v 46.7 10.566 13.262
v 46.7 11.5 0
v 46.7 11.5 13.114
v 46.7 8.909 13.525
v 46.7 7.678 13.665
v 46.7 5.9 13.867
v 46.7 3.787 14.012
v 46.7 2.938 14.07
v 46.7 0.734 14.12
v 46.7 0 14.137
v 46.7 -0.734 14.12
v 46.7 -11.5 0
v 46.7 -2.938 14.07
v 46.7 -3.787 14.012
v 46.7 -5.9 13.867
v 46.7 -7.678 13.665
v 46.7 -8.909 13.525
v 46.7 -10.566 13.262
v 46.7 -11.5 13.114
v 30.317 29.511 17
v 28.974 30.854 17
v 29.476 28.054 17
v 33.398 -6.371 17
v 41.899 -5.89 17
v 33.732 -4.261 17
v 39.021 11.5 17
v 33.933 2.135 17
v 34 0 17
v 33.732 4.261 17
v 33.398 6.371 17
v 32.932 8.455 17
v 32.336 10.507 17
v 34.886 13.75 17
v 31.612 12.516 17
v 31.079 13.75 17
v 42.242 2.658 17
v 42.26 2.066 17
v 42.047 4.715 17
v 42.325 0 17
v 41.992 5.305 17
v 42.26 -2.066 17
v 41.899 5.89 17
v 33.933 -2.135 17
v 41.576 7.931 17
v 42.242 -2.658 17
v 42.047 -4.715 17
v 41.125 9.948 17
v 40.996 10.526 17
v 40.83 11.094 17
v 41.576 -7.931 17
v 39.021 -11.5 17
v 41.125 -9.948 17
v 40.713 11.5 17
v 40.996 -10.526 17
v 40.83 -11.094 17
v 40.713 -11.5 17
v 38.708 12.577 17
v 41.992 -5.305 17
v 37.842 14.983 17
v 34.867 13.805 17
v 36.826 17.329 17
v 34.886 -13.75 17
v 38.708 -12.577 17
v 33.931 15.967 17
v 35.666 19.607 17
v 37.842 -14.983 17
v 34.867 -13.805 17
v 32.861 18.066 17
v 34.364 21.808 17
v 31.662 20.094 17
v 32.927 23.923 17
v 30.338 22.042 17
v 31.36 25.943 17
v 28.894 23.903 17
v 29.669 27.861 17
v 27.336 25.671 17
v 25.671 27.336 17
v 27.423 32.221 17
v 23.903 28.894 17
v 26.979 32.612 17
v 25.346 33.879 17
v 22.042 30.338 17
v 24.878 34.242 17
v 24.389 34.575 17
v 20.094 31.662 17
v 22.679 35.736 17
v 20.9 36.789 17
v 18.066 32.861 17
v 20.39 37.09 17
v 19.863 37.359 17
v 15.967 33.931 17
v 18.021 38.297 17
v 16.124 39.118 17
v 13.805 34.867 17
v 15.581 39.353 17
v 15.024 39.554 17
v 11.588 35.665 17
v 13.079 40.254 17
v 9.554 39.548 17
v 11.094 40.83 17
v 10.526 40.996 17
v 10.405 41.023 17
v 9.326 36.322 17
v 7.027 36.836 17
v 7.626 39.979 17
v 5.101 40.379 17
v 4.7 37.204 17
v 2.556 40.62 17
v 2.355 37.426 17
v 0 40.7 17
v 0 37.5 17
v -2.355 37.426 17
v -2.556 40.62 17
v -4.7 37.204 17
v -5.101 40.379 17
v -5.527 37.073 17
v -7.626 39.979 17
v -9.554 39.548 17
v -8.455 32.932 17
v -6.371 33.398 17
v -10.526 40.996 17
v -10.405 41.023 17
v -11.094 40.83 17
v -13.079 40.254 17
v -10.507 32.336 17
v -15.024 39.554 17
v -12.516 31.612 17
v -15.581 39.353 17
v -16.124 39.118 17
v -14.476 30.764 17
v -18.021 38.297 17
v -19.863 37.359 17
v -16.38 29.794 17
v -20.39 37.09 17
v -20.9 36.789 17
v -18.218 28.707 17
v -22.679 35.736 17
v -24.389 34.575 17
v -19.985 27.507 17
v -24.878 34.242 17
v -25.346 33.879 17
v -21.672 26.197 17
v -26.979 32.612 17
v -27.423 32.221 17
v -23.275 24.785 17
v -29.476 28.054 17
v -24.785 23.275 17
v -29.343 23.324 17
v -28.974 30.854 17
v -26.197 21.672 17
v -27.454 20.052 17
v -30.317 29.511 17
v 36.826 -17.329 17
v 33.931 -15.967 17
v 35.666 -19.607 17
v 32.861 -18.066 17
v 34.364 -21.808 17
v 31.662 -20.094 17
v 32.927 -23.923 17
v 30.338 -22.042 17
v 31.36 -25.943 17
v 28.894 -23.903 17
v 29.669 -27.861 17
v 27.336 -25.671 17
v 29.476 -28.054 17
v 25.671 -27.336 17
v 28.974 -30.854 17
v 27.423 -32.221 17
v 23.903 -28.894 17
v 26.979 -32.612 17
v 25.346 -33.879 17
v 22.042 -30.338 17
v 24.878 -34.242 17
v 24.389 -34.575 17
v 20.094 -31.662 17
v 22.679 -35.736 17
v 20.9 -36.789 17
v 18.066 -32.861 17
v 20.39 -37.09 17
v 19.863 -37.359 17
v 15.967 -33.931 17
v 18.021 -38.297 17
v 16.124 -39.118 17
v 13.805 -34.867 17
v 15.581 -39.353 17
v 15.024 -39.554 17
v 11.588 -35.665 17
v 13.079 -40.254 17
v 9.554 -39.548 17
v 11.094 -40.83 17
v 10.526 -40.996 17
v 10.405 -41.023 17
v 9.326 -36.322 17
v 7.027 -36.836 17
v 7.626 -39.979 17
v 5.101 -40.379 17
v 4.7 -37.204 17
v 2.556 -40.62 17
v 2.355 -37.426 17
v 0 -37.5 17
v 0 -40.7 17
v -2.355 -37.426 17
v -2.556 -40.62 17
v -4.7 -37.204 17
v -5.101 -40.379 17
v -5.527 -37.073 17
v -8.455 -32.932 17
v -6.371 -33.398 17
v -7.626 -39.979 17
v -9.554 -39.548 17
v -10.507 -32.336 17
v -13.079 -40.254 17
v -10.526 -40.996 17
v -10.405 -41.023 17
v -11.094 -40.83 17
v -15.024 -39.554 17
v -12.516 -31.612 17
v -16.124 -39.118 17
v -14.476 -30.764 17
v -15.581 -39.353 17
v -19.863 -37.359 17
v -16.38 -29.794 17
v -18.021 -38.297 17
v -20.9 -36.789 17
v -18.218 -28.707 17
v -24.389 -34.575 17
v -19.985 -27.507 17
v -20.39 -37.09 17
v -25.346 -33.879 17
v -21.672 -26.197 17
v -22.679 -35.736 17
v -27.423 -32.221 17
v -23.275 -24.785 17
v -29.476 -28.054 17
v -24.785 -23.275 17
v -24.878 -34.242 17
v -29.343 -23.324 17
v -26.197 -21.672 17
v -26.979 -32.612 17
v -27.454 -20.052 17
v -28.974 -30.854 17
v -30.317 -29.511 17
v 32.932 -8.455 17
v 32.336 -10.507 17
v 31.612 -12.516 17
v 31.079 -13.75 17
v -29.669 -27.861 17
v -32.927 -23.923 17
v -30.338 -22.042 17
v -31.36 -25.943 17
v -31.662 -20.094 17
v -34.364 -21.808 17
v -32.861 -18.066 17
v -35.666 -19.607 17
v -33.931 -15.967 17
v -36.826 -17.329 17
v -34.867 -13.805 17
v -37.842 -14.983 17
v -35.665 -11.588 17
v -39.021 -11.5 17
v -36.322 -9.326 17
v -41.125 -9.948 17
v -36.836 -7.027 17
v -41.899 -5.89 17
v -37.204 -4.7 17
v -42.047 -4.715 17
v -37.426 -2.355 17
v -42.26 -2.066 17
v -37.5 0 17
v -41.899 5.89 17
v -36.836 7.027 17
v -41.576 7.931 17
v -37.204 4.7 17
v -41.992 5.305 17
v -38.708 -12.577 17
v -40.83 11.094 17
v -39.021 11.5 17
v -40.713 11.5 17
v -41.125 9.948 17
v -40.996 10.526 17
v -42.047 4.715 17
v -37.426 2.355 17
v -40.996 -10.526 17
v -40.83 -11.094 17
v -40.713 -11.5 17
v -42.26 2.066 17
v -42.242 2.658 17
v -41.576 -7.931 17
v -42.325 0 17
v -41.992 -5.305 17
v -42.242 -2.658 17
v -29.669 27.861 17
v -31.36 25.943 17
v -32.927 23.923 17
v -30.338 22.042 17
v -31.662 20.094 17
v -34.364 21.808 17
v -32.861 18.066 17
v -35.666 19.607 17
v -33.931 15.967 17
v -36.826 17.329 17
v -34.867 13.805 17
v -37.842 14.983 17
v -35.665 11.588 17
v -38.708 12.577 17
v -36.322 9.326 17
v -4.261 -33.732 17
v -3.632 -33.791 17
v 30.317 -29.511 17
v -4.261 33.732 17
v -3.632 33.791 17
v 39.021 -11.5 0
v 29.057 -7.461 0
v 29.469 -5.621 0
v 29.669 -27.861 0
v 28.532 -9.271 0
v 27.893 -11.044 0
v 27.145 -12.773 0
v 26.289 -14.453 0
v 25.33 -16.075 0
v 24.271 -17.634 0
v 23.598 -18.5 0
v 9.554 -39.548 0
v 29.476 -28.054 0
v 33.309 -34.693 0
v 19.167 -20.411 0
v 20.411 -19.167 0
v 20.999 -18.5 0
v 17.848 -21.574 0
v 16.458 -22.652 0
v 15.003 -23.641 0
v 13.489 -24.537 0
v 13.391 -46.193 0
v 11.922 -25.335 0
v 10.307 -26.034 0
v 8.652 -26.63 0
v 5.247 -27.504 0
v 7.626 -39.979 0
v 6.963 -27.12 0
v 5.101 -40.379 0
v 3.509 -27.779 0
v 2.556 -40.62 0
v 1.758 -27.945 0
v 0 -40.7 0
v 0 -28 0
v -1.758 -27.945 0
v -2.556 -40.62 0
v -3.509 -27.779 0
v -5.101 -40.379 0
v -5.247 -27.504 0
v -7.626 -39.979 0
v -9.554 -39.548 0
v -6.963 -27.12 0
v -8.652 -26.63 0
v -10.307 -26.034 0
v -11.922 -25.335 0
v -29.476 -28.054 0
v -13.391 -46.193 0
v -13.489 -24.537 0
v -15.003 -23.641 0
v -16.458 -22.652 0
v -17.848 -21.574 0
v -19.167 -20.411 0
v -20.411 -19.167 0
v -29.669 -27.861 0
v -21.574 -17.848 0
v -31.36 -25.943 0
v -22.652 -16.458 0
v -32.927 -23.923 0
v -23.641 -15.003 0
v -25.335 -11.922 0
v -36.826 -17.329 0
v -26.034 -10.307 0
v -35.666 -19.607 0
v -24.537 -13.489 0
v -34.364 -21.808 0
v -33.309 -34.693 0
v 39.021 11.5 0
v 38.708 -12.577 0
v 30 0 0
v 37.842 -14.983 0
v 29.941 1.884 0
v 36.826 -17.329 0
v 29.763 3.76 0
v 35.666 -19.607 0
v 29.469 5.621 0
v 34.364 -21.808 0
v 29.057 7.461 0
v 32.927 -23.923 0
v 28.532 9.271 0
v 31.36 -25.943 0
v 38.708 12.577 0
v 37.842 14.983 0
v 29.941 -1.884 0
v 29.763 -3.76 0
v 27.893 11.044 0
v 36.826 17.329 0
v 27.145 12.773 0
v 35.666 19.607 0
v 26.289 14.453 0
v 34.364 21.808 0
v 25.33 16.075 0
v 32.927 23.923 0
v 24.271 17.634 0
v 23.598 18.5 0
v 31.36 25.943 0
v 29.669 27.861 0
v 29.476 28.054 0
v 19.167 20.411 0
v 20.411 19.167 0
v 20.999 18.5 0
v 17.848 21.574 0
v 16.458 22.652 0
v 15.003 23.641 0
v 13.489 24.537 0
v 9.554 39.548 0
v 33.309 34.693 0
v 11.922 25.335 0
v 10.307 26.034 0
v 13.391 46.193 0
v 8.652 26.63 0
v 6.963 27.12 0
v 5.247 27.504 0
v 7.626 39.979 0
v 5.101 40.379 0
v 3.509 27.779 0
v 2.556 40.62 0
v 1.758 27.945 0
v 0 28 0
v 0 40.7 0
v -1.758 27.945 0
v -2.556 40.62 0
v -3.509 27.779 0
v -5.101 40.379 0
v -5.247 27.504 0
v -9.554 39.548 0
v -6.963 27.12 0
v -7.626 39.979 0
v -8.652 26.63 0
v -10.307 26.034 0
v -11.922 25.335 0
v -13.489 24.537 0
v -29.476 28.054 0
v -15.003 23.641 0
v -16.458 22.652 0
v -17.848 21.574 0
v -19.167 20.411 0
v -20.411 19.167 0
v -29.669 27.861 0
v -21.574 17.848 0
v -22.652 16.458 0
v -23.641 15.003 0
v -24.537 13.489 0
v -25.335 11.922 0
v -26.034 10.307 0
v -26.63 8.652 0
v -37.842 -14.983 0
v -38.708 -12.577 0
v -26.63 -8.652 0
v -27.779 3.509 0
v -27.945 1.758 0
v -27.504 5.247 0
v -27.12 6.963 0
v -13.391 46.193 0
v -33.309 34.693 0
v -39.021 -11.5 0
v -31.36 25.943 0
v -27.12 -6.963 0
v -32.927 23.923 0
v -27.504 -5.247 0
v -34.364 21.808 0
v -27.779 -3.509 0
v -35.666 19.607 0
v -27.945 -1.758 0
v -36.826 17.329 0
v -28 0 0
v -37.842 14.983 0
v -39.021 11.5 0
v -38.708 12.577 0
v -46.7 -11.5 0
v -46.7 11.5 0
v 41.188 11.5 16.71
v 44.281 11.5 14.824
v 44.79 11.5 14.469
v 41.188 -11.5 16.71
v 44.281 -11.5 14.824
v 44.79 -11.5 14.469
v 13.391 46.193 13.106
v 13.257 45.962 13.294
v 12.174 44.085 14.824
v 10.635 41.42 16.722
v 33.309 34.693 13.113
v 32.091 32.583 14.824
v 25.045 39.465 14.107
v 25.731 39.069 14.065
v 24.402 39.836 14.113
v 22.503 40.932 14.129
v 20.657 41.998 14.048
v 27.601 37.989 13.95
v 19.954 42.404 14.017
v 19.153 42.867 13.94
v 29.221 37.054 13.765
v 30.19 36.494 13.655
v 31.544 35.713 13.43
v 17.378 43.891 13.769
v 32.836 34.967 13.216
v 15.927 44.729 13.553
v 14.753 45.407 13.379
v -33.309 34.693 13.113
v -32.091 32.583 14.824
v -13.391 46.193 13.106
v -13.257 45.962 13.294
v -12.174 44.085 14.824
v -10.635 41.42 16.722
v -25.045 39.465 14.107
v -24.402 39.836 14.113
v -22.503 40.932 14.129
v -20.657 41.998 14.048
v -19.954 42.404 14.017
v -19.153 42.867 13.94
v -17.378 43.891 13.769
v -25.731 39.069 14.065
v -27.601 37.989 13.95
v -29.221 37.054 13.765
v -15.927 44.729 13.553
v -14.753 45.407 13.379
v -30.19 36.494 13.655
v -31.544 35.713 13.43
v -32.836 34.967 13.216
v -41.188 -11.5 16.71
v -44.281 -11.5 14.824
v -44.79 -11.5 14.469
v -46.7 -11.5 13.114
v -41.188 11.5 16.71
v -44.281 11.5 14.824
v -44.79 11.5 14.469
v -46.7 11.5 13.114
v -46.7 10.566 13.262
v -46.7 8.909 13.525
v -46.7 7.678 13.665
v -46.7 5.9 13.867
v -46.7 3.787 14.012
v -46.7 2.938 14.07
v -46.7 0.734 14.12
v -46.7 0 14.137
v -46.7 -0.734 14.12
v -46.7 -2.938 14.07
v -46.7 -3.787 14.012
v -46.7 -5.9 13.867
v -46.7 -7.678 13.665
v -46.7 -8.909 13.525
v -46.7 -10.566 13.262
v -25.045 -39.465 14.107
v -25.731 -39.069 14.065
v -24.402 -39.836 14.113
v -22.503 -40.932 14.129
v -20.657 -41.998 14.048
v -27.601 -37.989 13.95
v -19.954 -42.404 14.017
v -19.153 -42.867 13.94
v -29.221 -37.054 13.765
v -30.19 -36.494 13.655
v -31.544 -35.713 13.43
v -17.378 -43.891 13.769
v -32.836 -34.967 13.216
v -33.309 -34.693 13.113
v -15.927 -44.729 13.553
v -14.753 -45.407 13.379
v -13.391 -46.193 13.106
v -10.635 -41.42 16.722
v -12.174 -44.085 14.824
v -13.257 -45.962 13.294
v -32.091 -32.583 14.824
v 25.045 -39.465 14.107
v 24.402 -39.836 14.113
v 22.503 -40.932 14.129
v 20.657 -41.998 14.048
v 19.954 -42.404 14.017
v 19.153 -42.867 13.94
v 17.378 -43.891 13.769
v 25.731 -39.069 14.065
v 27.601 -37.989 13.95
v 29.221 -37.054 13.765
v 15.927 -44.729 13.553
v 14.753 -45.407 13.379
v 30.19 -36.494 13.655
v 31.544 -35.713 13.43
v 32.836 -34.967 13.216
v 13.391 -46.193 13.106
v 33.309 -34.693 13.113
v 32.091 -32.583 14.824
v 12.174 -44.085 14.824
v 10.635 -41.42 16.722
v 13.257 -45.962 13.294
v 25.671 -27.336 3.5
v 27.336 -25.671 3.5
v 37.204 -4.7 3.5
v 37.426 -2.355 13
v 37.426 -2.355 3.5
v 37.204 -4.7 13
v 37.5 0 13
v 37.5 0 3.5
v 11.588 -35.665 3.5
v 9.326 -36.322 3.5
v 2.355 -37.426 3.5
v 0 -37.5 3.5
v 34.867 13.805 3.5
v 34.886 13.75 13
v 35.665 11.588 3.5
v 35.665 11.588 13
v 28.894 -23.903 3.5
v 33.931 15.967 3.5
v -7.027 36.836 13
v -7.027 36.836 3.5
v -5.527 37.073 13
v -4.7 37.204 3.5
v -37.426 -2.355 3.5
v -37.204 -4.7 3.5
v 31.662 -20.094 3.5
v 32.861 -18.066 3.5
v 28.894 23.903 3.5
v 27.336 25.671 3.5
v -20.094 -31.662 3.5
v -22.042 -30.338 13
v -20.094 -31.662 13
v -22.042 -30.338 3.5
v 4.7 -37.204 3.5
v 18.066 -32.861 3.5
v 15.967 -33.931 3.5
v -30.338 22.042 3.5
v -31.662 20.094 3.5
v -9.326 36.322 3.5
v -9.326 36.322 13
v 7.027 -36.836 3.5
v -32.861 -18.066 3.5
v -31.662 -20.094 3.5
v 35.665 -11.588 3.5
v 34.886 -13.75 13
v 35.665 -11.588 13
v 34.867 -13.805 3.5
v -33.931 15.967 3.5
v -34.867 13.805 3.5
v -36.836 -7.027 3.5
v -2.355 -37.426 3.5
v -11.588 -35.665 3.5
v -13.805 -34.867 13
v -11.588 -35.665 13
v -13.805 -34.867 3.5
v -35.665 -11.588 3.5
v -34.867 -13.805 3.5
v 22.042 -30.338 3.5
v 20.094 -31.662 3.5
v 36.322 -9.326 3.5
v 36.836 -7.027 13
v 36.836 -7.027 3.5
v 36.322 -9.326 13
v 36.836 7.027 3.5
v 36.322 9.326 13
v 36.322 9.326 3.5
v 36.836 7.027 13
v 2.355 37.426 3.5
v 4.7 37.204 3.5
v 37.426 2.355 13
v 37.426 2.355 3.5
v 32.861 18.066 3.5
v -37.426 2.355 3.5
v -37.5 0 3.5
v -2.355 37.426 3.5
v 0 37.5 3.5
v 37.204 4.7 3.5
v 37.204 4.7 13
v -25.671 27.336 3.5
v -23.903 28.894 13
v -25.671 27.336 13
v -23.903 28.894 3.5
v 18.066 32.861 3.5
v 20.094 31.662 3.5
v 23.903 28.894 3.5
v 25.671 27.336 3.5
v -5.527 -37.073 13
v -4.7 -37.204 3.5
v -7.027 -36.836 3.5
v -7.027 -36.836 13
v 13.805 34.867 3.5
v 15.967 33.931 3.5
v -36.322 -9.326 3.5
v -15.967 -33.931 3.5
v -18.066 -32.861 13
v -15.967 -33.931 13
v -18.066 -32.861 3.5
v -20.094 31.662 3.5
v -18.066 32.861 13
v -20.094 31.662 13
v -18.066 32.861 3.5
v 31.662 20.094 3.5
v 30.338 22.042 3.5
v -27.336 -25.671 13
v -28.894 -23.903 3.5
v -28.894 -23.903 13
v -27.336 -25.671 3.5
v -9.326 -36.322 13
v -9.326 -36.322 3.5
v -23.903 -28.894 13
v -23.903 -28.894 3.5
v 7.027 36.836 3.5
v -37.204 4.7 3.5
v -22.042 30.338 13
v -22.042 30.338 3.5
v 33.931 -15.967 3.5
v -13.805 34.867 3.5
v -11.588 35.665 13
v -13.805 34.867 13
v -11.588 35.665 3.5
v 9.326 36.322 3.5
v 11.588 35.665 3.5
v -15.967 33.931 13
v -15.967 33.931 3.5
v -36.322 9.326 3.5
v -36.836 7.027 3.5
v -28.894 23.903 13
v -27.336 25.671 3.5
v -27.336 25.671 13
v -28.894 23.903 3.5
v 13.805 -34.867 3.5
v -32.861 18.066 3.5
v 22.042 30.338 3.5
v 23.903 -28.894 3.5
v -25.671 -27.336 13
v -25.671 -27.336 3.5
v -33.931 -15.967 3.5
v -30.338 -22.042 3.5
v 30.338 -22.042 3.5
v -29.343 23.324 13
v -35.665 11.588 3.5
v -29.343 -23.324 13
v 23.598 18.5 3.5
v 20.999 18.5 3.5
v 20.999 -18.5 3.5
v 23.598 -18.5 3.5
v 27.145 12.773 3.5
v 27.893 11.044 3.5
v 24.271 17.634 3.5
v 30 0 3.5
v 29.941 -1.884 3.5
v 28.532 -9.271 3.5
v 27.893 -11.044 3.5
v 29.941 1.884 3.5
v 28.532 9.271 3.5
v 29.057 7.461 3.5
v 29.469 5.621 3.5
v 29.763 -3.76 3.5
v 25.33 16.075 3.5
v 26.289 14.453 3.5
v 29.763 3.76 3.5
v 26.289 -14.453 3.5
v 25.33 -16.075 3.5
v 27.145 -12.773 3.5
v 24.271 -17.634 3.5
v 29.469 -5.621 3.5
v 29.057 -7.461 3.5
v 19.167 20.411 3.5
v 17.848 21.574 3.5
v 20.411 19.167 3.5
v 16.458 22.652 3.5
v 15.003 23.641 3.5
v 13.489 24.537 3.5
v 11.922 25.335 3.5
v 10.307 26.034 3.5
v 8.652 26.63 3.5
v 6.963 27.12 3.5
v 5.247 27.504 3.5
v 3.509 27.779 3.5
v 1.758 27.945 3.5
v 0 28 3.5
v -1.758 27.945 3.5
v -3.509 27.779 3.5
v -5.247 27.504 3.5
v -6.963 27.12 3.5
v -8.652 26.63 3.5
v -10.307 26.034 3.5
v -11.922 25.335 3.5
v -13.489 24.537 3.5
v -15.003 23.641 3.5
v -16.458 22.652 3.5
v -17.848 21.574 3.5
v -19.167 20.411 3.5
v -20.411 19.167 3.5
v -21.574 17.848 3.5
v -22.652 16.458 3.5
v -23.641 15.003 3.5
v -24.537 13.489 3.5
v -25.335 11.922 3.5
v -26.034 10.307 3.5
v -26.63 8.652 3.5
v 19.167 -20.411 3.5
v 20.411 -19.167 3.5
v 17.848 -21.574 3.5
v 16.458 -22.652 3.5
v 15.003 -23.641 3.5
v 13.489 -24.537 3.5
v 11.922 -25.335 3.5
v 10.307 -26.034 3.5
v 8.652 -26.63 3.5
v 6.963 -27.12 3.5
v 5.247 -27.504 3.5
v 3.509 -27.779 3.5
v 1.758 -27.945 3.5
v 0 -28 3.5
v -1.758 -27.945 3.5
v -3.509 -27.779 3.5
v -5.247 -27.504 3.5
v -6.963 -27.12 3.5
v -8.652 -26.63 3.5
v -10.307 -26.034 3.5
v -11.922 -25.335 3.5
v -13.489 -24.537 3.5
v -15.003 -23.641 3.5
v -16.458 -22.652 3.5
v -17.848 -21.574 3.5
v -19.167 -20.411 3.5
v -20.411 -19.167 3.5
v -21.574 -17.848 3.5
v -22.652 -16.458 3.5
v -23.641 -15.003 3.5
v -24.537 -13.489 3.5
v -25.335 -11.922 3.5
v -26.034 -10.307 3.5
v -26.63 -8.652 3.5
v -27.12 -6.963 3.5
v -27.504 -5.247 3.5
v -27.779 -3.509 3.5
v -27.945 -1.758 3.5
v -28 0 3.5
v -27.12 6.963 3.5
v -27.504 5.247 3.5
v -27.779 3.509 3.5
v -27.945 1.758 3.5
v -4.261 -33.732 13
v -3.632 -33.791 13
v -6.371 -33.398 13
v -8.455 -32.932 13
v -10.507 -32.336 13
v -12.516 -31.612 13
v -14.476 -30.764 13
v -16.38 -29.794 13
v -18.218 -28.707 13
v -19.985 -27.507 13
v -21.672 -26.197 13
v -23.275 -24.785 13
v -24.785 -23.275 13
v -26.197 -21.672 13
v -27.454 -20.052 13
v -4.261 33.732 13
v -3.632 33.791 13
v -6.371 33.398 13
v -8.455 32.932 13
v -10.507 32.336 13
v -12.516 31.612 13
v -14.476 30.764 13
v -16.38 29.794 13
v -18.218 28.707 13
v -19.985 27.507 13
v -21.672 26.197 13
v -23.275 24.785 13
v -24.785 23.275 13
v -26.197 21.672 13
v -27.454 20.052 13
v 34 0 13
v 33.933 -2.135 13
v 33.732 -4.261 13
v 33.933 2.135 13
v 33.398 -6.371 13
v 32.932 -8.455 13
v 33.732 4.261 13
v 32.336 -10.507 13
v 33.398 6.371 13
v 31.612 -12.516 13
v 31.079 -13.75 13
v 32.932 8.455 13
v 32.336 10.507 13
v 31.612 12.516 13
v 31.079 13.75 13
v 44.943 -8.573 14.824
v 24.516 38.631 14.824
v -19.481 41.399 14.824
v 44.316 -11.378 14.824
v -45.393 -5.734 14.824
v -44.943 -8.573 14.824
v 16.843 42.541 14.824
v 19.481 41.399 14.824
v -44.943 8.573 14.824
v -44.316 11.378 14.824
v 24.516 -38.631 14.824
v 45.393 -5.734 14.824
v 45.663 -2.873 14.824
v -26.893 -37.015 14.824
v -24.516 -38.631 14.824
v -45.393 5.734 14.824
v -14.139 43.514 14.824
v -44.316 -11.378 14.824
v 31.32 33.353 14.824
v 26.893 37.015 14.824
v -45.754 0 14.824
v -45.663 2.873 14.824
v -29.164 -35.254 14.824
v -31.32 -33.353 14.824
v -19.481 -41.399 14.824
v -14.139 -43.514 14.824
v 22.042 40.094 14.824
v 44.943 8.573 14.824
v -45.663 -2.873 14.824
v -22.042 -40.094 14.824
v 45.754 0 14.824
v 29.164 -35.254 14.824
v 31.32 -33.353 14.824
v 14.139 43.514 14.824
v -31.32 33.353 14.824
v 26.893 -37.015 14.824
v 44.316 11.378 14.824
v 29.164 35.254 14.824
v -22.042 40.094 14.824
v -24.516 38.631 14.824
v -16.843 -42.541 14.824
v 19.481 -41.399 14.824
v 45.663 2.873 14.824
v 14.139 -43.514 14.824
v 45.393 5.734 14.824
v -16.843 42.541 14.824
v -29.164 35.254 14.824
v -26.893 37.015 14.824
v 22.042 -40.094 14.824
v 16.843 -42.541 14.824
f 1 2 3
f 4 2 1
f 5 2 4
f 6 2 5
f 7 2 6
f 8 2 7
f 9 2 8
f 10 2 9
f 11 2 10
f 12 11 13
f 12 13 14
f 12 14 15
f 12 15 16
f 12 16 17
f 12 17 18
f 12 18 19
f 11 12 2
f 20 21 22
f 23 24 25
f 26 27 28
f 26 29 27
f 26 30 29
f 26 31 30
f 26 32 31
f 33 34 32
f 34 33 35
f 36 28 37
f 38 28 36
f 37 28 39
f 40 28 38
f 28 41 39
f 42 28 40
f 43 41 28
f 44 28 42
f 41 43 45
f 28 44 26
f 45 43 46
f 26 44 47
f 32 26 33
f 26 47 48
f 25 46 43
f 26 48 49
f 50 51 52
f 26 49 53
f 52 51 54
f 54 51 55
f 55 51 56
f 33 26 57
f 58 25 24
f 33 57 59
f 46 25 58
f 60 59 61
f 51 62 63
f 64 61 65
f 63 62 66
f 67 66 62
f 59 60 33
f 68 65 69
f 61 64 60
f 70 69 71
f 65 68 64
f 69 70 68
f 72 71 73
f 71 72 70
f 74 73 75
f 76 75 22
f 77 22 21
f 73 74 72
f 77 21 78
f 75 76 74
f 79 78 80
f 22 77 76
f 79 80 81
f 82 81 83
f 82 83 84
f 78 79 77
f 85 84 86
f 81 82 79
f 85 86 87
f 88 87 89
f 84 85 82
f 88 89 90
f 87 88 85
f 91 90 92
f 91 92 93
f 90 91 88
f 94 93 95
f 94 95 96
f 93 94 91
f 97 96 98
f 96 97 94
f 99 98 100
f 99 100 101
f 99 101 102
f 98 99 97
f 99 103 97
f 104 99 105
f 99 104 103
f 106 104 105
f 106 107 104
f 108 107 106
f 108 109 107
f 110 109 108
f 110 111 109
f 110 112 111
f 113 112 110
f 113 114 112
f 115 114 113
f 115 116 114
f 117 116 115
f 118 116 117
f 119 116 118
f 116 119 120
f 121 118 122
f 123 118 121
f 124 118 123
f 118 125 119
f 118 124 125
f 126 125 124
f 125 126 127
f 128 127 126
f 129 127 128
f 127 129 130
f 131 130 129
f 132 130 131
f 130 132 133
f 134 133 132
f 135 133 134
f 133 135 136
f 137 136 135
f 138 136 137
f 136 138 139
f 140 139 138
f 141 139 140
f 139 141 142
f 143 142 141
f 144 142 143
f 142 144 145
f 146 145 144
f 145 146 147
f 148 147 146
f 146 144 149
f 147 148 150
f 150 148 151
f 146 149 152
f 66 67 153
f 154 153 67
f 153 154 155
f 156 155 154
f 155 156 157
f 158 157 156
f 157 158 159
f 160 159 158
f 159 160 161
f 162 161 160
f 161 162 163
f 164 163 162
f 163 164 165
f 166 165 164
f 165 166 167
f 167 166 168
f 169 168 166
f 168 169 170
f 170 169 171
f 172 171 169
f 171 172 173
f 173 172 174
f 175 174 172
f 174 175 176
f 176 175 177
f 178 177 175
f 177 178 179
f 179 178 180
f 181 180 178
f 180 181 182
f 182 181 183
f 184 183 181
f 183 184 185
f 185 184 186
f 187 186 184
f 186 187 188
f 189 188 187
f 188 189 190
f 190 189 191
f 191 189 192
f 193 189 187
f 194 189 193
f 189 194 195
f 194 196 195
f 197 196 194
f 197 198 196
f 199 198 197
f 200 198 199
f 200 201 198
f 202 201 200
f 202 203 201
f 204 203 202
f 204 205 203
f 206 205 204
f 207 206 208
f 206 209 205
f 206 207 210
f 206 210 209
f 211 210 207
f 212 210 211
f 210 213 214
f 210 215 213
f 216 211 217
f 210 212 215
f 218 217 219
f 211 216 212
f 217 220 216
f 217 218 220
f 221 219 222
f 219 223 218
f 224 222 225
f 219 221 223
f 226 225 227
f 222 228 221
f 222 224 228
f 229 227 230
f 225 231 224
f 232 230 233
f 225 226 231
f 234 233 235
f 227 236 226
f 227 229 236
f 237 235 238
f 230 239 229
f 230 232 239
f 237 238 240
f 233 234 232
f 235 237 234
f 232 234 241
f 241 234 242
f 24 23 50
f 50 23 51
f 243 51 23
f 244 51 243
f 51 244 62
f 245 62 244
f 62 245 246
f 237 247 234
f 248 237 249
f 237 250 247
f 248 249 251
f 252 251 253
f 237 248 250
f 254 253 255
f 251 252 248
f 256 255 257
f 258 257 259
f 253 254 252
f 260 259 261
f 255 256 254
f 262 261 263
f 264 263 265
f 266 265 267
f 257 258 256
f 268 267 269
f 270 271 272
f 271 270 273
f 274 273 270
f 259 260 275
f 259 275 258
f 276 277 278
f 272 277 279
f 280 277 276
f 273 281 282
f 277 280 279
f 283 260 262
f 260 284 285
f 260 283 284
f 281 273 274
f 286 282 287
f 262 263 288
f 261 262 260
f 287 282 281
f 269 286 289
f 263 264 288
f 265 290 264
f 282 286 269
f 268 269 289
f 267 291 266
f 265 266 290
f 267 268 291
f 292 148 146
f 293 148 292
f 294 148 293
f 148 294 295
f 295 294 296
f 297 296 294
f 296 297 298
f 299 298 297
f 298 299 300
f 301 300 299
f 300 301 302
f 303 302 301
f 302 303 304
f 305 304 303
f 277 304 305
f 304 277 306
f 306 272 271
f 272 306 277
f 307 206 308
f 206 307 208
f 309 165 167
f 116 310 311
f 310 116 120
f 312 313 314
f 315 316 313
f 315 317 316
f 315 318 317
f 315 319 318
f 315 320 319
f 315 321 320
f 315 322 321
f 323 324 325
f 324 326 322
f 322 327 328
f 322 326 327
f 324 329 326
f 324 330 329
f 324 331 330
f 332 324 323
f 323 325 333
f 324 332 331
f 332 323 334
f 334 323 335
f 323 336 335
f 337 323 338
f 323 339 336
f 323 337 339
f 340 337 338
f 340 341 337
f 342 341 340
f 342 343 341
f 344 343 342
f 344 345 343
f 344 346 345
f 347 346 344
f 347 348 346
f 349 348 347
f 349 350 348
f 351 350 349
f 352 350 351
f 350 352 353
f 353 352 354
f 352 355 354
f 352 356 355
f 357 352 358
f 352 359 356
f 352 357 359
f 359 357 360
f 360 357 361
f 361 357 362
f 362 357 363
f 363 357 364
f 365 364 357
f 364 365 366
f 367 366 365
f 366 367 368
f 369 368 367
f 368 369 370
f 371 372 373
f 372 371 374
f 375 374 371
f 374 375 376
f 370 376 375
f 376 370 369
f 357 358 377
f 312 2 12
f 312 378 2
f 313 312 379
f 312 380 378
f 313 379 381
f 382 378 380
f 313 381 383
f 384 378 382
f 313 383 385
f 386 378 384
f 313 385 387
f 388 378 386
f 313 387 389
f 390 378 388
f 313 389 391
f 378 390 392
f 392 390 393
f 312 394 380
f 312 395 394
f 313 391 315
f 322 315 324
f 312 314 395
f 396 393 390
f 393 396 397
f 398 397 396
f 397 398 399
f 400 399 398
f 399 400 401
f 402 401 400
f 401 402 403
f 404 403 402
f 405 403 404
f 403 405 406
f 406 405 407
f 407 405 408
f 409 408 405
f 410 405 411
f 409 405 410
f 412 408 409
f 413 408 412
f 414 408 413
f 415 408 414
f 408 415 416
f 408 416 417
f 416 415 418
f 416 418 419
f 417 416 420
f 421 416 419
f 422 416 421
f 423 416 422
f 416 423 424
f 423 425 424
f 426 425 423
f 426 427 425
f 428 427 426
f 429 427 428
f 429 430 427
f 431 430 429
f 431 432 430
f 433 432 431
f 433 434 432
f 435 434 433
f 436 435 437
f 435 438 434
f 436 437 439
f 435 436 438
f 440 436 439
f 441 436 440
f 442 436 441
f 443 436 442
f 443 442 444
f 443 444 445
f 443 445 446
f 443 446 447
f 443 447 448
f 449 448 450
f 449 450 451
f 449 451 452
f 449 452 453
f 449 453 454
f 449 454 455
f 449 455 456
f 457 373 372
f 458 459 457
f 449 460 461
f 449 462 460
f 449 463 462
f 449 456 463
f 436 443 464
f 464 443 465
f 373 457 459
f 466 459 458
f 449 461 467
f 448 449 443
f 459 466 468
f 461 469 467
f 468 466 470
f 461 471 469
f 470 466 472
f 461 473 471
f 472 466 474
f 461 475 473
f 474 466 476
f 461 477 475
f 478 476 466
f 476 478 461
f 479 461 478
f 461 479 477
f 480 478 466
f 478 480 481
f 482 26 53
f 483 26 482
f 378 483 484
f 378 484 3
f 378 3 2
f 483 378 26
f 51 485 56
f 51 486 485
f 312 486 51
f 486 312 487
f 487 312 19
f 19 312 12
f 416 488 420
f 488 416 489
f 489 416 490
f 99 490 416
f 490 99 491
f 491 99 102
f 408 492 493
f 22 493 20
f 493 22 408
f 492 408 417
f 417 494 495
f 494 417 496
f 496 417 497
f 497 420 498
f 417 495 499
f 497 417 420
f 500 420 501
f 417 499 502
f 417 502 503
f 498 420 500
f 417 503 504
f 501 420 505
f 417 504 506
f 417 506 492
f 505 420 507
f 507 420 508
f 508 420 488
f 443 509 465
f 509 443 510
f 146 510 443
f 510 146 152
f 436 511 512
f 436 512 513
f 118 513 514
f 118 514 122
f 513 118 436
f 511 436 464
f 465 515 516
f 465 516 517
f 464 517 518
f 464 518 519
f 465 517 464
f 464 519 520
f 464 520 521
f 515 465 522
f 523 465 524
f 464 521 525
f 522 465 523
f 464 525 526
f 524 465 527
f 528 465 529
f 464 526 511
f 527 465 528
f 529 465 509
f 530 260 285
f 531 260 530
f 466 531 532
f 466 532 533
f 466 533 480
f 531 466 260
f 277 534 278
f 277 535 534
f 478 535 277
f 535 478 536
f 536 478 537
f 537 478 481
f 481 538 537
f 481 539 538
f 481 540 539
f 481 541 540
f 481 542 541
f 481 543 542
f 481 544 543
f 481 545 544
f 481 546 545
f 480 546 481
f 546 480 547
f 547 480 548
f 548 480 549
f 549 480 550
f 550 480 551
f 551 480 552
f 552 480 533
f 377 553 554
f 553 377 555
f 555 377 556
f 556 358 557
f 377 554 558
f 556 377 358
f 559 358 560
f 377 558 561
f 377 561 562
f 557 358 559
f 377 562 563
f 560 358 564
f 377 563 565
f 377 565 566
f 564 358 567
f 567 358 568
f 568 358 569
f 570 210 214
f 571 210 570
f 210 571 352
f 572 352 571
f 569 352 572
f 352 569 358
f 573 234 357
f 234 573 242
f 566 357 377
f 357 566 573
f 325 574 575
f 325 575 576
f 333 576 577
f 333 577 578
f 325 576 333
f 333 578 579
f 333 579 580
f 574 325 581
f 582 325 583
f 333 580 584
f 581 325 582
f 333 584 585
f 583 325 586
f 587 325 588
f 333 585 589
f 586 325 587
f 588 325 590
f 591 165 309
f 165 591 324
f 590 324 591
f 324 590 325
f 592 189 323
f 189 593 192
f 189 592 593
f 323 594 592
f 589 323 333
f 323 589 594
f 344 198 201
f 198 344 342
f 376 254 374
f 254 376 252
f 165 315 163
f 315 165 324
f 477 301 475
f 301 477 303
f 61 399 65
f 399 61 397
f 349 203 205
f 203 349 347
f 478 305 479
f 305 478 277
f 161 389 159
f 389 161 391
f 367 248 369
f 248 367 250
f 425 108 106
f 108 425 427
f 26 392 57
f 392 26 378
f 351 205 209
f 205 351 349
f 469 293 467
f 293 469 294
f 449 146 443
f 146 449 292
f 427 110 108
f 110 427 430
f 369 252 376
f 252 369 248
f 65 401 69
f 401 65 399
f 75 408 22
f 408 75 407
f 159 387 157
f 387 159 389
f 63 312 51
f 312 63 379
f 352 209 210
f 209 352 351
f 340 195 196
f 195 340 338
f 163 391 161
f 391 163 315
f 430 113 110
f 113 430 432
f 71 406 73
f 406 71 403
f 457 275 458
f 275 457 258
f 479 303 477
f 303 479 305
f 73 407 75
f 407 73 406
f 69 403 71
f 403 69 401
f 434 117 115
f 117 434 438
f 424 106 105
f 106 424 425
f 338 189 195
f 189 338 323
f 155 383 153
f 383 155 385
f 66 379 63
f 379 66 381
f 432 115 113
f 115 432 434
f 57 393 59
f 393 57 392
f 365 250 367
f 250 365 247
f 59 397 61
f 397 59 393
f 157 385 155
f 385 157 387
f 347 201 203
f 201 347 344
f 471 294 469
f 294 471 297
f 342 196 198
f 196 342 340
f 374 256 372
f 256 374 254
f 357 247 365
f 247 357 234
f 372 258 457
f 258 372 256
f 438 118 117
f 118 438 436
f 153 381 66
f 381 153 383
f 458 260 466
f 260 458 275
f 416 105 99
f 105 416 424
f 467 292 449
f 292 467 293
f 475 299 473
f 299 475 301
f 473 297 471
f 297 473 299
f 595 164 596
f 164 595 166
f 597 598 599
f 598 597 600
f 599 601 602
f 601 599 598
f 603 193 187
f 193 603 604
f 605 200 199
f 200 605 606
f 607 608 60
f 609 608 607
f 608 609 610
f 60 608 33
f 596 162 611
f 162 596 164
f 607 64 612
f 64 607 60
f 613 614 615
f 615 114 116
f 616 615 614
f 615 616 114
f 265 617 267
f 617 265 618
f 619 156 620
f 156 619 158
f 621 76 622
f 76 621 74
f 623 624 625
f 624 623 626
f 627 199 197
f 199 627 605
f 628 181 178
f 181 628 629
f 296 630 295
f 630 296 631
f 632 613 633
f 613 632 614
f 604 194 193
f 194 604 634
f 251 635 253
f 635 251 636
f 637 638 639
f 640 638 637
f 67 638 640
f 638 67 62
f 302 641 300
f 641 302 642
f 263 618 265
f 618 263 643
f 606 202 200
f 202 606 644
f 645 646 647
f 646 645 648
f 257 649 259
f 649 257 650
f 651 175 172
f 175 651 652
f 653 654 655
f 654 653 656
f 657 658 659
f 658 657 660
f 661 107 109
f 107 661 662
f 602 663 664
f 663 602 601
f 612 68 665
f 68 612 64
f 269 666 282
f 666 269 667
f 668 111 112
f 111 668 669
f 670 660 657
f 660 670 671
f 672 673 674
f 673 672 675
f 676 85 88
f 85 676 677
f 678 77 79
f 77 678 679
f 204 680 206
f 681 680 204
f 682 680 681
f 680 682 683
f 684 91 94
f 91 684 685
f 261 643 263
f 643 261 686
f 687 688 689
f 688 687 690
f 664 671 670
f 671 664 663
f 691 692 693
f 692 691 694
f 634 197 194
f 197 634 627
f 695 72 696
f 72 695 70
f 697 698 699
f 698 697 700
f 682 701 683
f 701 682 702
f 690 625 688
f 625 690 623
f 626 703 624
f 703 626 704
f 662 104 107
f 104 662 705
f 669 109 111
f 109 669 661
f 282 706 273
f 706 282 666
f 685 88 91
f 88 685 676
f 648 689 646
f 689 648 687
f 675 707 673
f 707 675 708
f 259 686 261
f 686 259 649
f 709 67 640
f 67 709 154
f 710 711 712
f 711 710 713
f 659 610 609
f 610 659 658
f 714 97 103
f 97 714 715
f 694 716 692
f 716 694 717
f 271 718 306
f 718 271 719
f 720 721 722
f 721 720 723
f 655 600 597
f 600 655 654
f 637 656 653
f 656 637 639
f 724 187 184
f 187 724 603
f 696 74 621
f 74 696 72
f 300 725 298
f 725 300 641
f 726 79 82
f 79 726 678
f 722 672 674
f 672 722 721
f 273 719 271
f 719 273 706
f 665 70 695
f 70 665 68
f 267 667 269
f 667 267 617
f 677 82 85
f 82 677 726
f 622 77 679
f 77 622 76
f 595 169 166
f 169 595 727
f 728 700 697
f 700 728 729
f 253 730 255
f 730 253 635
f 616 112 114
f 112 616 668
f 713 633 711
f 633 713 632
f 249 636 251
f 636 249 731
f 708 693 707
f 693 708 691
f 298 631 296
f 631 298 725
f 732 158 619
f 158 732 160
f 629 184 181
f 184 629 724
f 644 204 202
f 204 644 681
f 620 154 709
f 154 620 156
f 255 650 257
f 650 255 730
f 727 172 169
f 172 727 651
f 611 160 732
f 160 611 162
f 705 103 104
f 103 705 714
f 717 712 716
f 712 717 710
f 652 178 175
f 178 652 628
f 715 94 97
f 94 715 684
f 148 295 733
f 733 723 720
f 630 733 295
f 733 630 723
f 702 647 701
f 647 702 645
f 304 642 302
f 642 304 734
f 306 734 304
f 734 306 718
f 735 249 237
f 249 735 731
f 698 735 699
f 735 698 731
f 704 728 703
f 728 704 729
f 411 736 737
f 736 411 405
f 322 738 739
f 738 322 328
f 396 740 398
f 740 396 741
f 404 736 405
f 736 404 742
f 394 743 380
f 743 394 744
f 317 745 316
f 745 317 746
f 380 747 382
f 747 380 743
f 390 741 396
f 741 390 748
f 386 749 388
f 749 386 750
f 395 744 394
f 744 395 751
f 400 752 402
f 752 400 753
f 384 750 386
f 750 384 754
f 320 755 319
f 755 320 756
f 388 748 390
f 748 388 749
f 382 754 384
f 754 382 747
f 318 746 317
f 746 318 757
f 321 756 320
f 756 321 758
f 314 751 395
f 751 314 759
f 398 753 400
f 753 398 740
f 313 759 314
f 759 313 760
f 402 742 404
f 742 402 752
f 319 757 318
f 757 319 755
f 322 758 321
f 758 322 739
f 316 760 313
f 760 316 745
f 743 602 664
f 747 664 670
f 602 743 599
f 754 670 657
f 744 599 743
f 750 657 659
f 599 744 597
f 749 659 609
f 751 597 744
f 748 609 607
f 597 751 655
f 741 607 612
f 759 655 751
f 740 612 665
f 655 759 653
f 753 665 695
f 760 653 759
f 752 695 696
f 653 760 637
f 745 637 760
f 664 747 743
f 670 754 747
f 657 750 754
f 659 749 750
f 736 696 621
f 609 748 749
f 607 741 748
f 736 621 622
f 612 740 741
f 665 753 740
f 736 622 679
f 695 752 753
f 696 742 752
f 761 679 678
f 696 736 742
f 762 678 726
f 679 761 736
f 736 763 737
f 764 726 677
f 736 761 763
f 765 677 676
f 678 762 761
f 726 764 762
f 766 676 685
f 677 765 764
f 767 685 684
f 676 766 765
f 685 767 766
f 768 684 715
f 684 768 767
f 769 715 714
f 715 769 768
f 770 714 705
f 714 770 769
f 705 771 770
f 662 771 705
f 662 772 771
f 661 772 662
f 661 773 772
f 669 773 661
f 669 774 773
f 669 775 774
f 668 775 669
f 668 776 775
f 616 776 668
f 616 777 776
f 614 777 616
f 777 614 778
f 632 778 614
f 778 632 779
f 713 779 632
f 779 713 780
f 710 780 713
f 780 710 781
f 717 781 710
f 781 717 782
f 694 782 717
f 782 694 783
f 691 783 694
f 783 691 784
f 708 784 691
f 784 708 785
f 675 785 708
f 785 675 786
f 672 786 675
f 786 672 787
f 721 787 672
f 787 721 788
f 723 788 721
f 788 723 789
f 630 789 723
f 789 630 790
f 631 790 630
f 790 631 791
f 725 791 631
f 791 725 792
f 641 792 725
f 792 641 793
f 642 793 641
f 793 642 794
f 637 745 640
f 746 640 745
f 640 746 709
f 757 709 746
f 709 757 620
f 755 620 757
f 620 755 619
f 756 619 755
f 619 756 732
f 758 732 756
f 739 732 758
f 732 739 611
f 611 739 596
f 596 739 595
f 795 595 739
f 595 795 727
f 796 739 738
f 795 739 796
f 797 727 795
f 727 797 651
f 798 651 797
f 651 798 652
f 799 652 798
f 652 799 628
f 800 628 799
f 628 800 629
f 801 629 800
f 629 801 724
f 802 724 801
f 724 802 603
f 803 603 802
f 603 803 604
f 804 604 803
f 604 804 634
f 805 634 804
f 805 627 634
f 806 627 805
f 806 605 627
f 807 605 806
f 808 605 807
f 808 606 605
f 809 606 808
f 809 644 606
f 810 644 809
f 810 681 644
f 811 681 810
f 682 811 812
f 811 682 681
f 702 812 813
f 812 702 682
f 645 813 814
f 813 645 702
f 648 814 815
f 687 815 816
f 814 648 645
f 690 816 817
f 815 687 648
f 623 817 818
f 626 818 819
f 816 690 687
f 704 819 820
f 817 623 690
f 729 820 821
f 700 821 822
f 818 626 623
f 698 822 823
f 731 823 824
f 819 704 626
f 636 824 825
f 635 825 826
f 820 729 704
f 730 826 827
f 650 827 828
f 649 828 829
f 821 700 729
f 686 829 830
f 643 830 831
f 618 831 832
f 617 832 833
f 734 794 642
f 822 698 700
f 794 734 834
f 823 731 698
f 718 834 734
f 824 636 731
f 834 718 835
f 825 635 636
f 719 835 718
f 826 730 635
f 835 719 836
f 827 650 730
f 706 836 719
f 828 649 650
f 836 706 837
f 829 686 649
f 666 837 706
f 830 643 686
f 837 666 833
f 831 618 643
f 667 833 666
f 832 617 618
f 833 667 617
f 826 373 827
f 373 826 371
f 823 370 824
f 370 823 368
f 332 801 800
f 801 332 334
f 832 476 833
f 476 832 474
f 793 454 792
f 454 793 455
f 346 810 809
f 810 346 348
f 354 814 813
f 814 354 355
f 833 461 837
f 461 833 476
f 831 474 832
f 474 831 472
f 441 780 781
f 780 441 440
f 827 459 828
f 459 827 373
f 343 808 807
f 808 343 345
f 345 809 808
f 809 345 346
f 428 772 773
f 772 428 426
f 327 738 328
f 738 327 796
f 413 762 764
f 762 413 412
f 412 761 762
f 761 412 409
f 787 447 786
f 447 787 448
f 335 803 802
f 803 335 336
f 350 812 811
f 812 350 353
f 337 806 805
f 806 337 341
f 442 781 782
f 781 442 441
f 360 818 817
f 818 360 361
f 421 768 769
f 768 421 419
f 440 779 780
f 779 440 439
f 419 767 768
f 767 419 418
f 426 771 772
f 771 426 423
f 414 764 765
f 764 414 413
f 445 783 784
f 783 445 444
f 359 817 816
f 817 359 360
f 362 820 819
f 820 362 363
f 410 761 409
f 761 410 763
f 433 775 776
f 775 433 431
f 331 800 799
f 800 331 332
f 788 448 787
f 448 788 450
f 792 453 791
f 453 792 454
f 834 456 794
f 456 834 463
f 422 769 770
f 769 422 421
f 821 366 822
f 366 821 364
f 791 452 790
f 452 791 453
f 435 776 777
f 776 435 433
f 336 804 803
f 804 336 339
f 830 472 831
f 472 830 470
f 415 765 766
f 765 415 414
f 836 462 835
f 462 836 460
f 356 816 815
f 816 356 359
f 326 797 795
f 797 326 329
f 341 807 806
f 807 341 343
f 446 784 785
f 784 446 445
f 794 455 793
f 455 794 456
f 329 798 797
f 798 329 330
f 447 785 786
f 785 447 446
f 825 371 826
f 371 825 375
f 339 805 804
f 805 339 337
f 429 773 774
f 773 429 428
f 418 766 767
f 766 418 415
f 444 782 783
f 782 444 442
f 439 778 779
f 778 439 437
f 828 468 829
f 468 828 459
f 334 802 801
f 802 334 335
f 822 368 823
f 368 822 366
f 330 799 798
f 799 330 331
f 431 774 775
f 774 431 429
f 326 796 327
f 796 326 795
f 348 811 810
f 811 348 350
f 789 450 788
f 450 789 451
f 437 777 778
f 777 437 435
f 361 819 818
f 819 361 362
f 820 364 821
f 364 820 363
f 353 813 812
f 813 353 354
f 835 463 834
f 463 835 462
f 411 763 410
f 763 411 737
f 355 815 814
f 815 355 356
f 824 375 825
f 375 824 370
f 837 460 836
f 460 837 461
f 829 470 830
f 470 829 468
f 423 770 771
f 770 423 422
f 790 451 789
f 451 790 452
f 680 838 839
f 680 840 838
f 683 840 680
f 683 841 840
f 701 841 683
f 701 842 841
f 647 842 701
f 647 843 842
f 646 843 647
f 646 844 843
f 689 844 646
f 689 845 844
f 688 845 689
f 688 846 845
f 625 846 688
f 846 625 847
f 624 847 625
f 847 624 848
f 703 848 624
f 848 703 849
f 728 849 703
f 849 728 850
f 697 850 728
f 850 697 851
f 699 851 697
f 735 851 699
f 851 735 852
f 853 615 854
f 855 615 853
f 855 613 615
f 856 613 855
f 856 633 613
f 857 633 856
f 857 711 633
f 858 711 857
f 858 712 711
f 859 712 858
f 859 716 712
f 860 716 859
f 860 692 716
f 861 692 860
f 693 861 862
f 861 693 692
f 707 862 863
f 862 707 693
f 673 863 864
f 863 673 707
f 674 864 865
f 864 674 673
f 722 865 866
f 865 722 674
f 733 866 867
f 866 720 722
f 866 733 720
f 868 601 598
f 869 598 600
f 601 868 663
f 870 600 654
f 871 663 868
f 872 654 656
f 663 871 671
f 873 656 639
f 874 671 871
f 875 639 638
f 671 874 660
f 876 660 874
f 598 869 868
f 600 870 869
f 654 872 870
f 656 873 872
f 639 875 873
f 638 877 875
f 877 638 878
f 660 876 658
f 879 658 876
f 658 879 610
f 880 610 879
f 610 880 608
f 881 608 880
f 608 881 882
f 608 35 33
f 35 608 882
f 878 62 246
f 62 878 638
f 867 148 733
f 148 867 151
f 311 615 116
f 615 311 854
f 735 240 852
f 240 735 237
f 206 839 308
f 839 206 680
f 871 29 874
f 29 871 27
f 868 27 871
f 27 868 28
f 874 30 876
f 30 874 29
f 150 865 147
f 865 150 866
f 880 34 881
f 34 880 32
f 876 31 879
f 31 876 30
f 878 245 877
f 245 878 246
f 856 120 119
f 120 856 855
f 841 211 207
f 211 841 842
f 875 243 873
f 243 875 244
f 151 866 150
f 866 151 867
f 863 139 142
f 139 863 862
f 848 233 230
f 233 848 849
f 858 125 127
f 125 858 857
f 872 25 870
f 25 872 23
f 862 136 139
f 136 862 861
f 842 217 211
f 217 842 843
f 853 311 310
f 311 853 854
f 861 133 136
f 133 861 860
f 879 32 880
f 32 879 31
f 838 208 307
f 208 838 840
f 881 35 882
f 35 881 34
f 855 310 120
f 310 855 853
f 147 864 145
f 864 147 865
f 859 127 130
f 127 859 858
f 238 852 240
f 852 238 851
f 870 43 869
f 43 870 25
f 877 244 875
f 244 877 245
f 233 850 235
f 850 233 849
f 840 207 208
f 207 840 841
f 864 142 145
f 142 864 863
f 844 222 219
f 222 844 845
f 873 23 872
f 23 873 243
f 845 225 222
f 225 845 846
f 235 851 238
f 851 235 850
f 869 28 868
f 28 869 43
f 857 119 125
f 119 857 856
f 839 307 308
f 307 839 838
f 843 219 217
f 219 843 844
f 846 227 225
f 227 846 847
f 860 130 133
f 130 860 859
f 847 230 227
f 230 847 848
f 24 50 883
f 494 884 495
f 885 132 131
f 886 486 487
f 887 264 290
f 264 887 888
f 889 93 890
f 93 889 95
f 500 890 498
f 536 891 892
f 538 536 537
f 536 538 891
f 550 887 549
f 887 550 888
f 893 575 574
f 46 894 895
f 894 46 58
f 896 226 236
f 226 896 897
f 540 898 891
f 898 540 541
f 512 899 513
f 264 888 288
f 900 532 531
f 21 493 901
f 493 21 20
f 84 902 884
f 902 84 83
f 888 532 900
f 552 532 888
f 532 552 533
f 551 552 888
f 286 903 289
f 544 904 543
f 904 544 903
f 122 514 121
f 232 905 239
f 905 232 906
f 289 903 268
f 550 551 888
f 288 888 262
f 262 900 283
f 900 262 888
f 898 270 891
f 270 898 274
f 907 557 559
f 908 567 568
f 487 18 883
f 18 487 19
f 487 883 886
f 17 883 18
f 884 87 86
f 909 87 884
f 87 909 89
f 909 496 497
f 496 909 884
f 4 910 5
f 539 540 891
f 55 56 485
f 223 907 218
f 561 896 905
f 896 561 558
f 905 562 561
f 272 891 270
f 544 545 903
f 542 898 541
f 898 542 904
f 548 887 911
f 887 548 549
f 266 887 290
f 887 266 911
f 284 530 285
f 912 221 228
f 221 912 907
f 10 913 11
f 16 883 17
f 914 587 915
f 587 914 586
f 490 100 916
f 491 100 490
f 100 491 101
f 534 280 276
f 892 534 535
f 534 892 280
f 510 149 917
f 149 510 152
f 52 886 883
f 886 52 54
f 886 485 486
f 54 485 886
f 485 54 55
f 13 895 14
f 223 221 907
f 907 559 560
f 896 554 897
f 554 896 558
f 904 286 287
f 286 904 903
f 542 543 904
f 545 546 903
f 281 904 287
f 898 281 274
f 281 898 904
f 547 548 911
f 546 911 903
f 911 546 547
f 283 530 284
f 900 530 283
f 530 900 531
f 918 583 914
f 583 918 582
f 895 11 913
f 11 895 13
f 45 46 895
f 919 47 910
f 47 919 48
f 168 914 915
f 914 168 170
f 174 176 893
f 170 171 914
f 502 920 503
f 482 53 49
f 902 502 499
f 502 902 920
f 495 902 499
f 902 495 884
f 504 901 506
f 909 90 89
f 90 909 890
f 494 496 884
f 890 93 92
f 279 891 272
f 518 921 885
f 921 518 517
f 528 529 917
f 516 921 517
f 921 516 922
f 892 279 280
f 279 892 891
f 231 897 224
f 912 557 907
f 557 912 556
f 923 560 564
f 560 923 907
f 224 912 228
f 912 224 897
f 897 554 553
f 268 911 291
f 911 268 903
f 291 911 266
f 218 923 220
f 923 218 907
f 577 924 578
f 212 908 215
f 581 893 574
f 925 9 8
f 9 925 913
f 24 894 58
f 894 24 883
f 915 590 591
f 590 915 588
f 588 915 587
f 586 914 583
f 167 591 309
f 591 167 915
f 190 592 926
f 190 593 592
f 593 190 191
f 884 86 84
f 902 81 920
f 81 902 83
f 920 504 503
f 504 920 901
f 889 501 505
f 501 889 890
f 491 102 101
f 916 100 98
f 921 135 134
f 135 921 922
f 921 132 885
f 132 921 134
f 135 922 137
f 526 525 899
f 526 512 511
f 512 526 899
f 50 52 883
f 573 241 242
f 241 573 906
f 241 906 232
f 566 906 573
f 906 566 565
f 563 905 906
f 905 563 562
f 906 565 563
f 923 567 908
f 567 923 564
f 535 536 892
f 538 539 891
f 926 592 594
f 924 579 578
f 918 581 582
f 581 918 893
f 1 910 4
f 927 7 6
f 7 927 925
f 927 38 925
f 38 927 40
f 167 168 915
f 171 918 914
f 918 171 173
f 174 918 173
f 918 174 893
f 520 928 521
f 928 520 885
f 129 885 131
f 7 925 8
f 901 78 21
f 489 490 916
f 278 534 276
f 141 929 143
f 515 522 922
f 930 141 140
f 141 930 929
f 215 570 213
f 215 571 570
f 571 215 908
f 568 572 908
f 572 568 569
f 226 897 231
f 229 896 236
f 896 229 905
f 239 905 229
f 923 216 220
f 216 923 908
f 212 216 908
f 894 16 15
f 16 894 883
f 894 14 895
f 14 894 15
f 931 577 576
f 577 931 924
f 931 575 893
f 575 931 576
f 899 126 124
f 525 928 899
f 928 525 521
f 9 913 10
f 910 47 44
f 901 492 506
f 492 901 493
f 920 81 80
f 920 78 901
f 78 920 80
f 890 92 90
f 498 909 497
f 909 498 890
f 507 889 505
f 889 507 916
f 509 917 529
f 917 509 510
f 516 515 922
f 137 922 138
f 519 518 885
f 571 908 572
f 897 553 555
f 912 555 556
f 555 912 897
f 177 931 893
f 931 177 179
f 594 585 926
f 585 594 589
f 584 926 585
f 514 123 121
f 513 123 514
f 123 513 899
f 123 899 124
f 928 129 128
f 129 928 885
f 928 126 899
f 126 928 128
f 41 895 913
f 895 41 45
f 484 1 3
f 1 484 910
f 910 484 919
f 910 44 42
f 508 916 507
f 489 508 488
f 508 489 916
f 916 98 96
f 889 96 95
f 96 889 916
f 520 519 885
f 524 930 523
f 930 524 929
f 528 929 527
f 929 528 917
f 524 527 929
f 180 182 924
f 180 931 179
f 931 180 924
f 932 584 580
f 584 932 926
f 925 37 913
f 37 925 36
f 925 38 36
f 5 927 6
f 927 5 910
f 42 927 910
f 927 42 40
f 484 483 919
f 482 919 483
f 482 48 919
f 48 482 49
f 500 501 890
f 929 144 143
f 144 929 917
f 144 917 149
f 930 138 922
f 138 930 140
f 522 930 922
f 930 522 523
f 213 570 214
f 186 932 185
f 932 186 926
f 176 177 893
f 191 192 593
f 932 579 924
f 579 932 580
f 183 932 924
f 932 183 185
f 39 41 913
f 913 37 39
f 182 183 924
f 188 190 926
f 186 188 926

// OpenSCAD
module lequip509(
                 h = 17,
                 d = 75,
                 thickness = 3.2,

                 h_inner = 3.5,
                 d_inner = 56,

                 s_outer_w = 23,
                 s_outer_l = 6,

                 s_inner_w = 27.5,
                 s_inner_h = 4,
                 s_inner_l = 3.5,

                 //cut_angle = 36 * 2,
                 cut_w = 37,
                 cut_l = 2,
                ) {

    d_outer = d + 2*thickness;

    intersection() {
        union() {
            // outer
            difference() {
                union() {
                    // shell
                    cylinder(h=h, d=d_outer);
                    // outer stumps
                    for (i=[0:60:359])
                        rotate([0,0,i])
                            translate([0,-s_outer_w/2,0])
                                cube([d_outer/2+s_outer_l,s_outer_w,h]);
                }
                // hole
                translate([0,0,-1])
                    cylinder(h=h+2, d=d);
            }


            // inner
            difference() {
                cylinder(h=h_inner, d=d_outer);
                translate([0,0,-1])
                    cylinder(h=h_inner+2, d=d_inner);

                // cut out
                intersection() {
                    translate([0,-cut_w/2,-1])
                        cube([d_outer/2,cut_w,h_inner+2]);
                    translate([0,0,-1])
                        cylinder(d=d_inner+cut_l*2,h=h_inner+2);
                }
            }

            // inner stumps
            intersection() {
                difference() {
                    for (i=[0:120:359])
                        rotate([0,0,i])
                            translate([0,-s_inner_w/2,h-s_inner_h])
                                cube([d_outer/2,s_inner_w,s_inner_h]);
                    // inner hole
                    translate([0,0,-1])
                        cylinder(h=h+2, d=d-s_inner_l*2);
                }
                // outer shell border
                cylinder(h=h+2, d=d_outer);
            }

        }

        // round corners
        translate([0,0,-d_outer+1.7*h])
            sphere(r=d_outer);
    }


}

lequip509($fn=100);
